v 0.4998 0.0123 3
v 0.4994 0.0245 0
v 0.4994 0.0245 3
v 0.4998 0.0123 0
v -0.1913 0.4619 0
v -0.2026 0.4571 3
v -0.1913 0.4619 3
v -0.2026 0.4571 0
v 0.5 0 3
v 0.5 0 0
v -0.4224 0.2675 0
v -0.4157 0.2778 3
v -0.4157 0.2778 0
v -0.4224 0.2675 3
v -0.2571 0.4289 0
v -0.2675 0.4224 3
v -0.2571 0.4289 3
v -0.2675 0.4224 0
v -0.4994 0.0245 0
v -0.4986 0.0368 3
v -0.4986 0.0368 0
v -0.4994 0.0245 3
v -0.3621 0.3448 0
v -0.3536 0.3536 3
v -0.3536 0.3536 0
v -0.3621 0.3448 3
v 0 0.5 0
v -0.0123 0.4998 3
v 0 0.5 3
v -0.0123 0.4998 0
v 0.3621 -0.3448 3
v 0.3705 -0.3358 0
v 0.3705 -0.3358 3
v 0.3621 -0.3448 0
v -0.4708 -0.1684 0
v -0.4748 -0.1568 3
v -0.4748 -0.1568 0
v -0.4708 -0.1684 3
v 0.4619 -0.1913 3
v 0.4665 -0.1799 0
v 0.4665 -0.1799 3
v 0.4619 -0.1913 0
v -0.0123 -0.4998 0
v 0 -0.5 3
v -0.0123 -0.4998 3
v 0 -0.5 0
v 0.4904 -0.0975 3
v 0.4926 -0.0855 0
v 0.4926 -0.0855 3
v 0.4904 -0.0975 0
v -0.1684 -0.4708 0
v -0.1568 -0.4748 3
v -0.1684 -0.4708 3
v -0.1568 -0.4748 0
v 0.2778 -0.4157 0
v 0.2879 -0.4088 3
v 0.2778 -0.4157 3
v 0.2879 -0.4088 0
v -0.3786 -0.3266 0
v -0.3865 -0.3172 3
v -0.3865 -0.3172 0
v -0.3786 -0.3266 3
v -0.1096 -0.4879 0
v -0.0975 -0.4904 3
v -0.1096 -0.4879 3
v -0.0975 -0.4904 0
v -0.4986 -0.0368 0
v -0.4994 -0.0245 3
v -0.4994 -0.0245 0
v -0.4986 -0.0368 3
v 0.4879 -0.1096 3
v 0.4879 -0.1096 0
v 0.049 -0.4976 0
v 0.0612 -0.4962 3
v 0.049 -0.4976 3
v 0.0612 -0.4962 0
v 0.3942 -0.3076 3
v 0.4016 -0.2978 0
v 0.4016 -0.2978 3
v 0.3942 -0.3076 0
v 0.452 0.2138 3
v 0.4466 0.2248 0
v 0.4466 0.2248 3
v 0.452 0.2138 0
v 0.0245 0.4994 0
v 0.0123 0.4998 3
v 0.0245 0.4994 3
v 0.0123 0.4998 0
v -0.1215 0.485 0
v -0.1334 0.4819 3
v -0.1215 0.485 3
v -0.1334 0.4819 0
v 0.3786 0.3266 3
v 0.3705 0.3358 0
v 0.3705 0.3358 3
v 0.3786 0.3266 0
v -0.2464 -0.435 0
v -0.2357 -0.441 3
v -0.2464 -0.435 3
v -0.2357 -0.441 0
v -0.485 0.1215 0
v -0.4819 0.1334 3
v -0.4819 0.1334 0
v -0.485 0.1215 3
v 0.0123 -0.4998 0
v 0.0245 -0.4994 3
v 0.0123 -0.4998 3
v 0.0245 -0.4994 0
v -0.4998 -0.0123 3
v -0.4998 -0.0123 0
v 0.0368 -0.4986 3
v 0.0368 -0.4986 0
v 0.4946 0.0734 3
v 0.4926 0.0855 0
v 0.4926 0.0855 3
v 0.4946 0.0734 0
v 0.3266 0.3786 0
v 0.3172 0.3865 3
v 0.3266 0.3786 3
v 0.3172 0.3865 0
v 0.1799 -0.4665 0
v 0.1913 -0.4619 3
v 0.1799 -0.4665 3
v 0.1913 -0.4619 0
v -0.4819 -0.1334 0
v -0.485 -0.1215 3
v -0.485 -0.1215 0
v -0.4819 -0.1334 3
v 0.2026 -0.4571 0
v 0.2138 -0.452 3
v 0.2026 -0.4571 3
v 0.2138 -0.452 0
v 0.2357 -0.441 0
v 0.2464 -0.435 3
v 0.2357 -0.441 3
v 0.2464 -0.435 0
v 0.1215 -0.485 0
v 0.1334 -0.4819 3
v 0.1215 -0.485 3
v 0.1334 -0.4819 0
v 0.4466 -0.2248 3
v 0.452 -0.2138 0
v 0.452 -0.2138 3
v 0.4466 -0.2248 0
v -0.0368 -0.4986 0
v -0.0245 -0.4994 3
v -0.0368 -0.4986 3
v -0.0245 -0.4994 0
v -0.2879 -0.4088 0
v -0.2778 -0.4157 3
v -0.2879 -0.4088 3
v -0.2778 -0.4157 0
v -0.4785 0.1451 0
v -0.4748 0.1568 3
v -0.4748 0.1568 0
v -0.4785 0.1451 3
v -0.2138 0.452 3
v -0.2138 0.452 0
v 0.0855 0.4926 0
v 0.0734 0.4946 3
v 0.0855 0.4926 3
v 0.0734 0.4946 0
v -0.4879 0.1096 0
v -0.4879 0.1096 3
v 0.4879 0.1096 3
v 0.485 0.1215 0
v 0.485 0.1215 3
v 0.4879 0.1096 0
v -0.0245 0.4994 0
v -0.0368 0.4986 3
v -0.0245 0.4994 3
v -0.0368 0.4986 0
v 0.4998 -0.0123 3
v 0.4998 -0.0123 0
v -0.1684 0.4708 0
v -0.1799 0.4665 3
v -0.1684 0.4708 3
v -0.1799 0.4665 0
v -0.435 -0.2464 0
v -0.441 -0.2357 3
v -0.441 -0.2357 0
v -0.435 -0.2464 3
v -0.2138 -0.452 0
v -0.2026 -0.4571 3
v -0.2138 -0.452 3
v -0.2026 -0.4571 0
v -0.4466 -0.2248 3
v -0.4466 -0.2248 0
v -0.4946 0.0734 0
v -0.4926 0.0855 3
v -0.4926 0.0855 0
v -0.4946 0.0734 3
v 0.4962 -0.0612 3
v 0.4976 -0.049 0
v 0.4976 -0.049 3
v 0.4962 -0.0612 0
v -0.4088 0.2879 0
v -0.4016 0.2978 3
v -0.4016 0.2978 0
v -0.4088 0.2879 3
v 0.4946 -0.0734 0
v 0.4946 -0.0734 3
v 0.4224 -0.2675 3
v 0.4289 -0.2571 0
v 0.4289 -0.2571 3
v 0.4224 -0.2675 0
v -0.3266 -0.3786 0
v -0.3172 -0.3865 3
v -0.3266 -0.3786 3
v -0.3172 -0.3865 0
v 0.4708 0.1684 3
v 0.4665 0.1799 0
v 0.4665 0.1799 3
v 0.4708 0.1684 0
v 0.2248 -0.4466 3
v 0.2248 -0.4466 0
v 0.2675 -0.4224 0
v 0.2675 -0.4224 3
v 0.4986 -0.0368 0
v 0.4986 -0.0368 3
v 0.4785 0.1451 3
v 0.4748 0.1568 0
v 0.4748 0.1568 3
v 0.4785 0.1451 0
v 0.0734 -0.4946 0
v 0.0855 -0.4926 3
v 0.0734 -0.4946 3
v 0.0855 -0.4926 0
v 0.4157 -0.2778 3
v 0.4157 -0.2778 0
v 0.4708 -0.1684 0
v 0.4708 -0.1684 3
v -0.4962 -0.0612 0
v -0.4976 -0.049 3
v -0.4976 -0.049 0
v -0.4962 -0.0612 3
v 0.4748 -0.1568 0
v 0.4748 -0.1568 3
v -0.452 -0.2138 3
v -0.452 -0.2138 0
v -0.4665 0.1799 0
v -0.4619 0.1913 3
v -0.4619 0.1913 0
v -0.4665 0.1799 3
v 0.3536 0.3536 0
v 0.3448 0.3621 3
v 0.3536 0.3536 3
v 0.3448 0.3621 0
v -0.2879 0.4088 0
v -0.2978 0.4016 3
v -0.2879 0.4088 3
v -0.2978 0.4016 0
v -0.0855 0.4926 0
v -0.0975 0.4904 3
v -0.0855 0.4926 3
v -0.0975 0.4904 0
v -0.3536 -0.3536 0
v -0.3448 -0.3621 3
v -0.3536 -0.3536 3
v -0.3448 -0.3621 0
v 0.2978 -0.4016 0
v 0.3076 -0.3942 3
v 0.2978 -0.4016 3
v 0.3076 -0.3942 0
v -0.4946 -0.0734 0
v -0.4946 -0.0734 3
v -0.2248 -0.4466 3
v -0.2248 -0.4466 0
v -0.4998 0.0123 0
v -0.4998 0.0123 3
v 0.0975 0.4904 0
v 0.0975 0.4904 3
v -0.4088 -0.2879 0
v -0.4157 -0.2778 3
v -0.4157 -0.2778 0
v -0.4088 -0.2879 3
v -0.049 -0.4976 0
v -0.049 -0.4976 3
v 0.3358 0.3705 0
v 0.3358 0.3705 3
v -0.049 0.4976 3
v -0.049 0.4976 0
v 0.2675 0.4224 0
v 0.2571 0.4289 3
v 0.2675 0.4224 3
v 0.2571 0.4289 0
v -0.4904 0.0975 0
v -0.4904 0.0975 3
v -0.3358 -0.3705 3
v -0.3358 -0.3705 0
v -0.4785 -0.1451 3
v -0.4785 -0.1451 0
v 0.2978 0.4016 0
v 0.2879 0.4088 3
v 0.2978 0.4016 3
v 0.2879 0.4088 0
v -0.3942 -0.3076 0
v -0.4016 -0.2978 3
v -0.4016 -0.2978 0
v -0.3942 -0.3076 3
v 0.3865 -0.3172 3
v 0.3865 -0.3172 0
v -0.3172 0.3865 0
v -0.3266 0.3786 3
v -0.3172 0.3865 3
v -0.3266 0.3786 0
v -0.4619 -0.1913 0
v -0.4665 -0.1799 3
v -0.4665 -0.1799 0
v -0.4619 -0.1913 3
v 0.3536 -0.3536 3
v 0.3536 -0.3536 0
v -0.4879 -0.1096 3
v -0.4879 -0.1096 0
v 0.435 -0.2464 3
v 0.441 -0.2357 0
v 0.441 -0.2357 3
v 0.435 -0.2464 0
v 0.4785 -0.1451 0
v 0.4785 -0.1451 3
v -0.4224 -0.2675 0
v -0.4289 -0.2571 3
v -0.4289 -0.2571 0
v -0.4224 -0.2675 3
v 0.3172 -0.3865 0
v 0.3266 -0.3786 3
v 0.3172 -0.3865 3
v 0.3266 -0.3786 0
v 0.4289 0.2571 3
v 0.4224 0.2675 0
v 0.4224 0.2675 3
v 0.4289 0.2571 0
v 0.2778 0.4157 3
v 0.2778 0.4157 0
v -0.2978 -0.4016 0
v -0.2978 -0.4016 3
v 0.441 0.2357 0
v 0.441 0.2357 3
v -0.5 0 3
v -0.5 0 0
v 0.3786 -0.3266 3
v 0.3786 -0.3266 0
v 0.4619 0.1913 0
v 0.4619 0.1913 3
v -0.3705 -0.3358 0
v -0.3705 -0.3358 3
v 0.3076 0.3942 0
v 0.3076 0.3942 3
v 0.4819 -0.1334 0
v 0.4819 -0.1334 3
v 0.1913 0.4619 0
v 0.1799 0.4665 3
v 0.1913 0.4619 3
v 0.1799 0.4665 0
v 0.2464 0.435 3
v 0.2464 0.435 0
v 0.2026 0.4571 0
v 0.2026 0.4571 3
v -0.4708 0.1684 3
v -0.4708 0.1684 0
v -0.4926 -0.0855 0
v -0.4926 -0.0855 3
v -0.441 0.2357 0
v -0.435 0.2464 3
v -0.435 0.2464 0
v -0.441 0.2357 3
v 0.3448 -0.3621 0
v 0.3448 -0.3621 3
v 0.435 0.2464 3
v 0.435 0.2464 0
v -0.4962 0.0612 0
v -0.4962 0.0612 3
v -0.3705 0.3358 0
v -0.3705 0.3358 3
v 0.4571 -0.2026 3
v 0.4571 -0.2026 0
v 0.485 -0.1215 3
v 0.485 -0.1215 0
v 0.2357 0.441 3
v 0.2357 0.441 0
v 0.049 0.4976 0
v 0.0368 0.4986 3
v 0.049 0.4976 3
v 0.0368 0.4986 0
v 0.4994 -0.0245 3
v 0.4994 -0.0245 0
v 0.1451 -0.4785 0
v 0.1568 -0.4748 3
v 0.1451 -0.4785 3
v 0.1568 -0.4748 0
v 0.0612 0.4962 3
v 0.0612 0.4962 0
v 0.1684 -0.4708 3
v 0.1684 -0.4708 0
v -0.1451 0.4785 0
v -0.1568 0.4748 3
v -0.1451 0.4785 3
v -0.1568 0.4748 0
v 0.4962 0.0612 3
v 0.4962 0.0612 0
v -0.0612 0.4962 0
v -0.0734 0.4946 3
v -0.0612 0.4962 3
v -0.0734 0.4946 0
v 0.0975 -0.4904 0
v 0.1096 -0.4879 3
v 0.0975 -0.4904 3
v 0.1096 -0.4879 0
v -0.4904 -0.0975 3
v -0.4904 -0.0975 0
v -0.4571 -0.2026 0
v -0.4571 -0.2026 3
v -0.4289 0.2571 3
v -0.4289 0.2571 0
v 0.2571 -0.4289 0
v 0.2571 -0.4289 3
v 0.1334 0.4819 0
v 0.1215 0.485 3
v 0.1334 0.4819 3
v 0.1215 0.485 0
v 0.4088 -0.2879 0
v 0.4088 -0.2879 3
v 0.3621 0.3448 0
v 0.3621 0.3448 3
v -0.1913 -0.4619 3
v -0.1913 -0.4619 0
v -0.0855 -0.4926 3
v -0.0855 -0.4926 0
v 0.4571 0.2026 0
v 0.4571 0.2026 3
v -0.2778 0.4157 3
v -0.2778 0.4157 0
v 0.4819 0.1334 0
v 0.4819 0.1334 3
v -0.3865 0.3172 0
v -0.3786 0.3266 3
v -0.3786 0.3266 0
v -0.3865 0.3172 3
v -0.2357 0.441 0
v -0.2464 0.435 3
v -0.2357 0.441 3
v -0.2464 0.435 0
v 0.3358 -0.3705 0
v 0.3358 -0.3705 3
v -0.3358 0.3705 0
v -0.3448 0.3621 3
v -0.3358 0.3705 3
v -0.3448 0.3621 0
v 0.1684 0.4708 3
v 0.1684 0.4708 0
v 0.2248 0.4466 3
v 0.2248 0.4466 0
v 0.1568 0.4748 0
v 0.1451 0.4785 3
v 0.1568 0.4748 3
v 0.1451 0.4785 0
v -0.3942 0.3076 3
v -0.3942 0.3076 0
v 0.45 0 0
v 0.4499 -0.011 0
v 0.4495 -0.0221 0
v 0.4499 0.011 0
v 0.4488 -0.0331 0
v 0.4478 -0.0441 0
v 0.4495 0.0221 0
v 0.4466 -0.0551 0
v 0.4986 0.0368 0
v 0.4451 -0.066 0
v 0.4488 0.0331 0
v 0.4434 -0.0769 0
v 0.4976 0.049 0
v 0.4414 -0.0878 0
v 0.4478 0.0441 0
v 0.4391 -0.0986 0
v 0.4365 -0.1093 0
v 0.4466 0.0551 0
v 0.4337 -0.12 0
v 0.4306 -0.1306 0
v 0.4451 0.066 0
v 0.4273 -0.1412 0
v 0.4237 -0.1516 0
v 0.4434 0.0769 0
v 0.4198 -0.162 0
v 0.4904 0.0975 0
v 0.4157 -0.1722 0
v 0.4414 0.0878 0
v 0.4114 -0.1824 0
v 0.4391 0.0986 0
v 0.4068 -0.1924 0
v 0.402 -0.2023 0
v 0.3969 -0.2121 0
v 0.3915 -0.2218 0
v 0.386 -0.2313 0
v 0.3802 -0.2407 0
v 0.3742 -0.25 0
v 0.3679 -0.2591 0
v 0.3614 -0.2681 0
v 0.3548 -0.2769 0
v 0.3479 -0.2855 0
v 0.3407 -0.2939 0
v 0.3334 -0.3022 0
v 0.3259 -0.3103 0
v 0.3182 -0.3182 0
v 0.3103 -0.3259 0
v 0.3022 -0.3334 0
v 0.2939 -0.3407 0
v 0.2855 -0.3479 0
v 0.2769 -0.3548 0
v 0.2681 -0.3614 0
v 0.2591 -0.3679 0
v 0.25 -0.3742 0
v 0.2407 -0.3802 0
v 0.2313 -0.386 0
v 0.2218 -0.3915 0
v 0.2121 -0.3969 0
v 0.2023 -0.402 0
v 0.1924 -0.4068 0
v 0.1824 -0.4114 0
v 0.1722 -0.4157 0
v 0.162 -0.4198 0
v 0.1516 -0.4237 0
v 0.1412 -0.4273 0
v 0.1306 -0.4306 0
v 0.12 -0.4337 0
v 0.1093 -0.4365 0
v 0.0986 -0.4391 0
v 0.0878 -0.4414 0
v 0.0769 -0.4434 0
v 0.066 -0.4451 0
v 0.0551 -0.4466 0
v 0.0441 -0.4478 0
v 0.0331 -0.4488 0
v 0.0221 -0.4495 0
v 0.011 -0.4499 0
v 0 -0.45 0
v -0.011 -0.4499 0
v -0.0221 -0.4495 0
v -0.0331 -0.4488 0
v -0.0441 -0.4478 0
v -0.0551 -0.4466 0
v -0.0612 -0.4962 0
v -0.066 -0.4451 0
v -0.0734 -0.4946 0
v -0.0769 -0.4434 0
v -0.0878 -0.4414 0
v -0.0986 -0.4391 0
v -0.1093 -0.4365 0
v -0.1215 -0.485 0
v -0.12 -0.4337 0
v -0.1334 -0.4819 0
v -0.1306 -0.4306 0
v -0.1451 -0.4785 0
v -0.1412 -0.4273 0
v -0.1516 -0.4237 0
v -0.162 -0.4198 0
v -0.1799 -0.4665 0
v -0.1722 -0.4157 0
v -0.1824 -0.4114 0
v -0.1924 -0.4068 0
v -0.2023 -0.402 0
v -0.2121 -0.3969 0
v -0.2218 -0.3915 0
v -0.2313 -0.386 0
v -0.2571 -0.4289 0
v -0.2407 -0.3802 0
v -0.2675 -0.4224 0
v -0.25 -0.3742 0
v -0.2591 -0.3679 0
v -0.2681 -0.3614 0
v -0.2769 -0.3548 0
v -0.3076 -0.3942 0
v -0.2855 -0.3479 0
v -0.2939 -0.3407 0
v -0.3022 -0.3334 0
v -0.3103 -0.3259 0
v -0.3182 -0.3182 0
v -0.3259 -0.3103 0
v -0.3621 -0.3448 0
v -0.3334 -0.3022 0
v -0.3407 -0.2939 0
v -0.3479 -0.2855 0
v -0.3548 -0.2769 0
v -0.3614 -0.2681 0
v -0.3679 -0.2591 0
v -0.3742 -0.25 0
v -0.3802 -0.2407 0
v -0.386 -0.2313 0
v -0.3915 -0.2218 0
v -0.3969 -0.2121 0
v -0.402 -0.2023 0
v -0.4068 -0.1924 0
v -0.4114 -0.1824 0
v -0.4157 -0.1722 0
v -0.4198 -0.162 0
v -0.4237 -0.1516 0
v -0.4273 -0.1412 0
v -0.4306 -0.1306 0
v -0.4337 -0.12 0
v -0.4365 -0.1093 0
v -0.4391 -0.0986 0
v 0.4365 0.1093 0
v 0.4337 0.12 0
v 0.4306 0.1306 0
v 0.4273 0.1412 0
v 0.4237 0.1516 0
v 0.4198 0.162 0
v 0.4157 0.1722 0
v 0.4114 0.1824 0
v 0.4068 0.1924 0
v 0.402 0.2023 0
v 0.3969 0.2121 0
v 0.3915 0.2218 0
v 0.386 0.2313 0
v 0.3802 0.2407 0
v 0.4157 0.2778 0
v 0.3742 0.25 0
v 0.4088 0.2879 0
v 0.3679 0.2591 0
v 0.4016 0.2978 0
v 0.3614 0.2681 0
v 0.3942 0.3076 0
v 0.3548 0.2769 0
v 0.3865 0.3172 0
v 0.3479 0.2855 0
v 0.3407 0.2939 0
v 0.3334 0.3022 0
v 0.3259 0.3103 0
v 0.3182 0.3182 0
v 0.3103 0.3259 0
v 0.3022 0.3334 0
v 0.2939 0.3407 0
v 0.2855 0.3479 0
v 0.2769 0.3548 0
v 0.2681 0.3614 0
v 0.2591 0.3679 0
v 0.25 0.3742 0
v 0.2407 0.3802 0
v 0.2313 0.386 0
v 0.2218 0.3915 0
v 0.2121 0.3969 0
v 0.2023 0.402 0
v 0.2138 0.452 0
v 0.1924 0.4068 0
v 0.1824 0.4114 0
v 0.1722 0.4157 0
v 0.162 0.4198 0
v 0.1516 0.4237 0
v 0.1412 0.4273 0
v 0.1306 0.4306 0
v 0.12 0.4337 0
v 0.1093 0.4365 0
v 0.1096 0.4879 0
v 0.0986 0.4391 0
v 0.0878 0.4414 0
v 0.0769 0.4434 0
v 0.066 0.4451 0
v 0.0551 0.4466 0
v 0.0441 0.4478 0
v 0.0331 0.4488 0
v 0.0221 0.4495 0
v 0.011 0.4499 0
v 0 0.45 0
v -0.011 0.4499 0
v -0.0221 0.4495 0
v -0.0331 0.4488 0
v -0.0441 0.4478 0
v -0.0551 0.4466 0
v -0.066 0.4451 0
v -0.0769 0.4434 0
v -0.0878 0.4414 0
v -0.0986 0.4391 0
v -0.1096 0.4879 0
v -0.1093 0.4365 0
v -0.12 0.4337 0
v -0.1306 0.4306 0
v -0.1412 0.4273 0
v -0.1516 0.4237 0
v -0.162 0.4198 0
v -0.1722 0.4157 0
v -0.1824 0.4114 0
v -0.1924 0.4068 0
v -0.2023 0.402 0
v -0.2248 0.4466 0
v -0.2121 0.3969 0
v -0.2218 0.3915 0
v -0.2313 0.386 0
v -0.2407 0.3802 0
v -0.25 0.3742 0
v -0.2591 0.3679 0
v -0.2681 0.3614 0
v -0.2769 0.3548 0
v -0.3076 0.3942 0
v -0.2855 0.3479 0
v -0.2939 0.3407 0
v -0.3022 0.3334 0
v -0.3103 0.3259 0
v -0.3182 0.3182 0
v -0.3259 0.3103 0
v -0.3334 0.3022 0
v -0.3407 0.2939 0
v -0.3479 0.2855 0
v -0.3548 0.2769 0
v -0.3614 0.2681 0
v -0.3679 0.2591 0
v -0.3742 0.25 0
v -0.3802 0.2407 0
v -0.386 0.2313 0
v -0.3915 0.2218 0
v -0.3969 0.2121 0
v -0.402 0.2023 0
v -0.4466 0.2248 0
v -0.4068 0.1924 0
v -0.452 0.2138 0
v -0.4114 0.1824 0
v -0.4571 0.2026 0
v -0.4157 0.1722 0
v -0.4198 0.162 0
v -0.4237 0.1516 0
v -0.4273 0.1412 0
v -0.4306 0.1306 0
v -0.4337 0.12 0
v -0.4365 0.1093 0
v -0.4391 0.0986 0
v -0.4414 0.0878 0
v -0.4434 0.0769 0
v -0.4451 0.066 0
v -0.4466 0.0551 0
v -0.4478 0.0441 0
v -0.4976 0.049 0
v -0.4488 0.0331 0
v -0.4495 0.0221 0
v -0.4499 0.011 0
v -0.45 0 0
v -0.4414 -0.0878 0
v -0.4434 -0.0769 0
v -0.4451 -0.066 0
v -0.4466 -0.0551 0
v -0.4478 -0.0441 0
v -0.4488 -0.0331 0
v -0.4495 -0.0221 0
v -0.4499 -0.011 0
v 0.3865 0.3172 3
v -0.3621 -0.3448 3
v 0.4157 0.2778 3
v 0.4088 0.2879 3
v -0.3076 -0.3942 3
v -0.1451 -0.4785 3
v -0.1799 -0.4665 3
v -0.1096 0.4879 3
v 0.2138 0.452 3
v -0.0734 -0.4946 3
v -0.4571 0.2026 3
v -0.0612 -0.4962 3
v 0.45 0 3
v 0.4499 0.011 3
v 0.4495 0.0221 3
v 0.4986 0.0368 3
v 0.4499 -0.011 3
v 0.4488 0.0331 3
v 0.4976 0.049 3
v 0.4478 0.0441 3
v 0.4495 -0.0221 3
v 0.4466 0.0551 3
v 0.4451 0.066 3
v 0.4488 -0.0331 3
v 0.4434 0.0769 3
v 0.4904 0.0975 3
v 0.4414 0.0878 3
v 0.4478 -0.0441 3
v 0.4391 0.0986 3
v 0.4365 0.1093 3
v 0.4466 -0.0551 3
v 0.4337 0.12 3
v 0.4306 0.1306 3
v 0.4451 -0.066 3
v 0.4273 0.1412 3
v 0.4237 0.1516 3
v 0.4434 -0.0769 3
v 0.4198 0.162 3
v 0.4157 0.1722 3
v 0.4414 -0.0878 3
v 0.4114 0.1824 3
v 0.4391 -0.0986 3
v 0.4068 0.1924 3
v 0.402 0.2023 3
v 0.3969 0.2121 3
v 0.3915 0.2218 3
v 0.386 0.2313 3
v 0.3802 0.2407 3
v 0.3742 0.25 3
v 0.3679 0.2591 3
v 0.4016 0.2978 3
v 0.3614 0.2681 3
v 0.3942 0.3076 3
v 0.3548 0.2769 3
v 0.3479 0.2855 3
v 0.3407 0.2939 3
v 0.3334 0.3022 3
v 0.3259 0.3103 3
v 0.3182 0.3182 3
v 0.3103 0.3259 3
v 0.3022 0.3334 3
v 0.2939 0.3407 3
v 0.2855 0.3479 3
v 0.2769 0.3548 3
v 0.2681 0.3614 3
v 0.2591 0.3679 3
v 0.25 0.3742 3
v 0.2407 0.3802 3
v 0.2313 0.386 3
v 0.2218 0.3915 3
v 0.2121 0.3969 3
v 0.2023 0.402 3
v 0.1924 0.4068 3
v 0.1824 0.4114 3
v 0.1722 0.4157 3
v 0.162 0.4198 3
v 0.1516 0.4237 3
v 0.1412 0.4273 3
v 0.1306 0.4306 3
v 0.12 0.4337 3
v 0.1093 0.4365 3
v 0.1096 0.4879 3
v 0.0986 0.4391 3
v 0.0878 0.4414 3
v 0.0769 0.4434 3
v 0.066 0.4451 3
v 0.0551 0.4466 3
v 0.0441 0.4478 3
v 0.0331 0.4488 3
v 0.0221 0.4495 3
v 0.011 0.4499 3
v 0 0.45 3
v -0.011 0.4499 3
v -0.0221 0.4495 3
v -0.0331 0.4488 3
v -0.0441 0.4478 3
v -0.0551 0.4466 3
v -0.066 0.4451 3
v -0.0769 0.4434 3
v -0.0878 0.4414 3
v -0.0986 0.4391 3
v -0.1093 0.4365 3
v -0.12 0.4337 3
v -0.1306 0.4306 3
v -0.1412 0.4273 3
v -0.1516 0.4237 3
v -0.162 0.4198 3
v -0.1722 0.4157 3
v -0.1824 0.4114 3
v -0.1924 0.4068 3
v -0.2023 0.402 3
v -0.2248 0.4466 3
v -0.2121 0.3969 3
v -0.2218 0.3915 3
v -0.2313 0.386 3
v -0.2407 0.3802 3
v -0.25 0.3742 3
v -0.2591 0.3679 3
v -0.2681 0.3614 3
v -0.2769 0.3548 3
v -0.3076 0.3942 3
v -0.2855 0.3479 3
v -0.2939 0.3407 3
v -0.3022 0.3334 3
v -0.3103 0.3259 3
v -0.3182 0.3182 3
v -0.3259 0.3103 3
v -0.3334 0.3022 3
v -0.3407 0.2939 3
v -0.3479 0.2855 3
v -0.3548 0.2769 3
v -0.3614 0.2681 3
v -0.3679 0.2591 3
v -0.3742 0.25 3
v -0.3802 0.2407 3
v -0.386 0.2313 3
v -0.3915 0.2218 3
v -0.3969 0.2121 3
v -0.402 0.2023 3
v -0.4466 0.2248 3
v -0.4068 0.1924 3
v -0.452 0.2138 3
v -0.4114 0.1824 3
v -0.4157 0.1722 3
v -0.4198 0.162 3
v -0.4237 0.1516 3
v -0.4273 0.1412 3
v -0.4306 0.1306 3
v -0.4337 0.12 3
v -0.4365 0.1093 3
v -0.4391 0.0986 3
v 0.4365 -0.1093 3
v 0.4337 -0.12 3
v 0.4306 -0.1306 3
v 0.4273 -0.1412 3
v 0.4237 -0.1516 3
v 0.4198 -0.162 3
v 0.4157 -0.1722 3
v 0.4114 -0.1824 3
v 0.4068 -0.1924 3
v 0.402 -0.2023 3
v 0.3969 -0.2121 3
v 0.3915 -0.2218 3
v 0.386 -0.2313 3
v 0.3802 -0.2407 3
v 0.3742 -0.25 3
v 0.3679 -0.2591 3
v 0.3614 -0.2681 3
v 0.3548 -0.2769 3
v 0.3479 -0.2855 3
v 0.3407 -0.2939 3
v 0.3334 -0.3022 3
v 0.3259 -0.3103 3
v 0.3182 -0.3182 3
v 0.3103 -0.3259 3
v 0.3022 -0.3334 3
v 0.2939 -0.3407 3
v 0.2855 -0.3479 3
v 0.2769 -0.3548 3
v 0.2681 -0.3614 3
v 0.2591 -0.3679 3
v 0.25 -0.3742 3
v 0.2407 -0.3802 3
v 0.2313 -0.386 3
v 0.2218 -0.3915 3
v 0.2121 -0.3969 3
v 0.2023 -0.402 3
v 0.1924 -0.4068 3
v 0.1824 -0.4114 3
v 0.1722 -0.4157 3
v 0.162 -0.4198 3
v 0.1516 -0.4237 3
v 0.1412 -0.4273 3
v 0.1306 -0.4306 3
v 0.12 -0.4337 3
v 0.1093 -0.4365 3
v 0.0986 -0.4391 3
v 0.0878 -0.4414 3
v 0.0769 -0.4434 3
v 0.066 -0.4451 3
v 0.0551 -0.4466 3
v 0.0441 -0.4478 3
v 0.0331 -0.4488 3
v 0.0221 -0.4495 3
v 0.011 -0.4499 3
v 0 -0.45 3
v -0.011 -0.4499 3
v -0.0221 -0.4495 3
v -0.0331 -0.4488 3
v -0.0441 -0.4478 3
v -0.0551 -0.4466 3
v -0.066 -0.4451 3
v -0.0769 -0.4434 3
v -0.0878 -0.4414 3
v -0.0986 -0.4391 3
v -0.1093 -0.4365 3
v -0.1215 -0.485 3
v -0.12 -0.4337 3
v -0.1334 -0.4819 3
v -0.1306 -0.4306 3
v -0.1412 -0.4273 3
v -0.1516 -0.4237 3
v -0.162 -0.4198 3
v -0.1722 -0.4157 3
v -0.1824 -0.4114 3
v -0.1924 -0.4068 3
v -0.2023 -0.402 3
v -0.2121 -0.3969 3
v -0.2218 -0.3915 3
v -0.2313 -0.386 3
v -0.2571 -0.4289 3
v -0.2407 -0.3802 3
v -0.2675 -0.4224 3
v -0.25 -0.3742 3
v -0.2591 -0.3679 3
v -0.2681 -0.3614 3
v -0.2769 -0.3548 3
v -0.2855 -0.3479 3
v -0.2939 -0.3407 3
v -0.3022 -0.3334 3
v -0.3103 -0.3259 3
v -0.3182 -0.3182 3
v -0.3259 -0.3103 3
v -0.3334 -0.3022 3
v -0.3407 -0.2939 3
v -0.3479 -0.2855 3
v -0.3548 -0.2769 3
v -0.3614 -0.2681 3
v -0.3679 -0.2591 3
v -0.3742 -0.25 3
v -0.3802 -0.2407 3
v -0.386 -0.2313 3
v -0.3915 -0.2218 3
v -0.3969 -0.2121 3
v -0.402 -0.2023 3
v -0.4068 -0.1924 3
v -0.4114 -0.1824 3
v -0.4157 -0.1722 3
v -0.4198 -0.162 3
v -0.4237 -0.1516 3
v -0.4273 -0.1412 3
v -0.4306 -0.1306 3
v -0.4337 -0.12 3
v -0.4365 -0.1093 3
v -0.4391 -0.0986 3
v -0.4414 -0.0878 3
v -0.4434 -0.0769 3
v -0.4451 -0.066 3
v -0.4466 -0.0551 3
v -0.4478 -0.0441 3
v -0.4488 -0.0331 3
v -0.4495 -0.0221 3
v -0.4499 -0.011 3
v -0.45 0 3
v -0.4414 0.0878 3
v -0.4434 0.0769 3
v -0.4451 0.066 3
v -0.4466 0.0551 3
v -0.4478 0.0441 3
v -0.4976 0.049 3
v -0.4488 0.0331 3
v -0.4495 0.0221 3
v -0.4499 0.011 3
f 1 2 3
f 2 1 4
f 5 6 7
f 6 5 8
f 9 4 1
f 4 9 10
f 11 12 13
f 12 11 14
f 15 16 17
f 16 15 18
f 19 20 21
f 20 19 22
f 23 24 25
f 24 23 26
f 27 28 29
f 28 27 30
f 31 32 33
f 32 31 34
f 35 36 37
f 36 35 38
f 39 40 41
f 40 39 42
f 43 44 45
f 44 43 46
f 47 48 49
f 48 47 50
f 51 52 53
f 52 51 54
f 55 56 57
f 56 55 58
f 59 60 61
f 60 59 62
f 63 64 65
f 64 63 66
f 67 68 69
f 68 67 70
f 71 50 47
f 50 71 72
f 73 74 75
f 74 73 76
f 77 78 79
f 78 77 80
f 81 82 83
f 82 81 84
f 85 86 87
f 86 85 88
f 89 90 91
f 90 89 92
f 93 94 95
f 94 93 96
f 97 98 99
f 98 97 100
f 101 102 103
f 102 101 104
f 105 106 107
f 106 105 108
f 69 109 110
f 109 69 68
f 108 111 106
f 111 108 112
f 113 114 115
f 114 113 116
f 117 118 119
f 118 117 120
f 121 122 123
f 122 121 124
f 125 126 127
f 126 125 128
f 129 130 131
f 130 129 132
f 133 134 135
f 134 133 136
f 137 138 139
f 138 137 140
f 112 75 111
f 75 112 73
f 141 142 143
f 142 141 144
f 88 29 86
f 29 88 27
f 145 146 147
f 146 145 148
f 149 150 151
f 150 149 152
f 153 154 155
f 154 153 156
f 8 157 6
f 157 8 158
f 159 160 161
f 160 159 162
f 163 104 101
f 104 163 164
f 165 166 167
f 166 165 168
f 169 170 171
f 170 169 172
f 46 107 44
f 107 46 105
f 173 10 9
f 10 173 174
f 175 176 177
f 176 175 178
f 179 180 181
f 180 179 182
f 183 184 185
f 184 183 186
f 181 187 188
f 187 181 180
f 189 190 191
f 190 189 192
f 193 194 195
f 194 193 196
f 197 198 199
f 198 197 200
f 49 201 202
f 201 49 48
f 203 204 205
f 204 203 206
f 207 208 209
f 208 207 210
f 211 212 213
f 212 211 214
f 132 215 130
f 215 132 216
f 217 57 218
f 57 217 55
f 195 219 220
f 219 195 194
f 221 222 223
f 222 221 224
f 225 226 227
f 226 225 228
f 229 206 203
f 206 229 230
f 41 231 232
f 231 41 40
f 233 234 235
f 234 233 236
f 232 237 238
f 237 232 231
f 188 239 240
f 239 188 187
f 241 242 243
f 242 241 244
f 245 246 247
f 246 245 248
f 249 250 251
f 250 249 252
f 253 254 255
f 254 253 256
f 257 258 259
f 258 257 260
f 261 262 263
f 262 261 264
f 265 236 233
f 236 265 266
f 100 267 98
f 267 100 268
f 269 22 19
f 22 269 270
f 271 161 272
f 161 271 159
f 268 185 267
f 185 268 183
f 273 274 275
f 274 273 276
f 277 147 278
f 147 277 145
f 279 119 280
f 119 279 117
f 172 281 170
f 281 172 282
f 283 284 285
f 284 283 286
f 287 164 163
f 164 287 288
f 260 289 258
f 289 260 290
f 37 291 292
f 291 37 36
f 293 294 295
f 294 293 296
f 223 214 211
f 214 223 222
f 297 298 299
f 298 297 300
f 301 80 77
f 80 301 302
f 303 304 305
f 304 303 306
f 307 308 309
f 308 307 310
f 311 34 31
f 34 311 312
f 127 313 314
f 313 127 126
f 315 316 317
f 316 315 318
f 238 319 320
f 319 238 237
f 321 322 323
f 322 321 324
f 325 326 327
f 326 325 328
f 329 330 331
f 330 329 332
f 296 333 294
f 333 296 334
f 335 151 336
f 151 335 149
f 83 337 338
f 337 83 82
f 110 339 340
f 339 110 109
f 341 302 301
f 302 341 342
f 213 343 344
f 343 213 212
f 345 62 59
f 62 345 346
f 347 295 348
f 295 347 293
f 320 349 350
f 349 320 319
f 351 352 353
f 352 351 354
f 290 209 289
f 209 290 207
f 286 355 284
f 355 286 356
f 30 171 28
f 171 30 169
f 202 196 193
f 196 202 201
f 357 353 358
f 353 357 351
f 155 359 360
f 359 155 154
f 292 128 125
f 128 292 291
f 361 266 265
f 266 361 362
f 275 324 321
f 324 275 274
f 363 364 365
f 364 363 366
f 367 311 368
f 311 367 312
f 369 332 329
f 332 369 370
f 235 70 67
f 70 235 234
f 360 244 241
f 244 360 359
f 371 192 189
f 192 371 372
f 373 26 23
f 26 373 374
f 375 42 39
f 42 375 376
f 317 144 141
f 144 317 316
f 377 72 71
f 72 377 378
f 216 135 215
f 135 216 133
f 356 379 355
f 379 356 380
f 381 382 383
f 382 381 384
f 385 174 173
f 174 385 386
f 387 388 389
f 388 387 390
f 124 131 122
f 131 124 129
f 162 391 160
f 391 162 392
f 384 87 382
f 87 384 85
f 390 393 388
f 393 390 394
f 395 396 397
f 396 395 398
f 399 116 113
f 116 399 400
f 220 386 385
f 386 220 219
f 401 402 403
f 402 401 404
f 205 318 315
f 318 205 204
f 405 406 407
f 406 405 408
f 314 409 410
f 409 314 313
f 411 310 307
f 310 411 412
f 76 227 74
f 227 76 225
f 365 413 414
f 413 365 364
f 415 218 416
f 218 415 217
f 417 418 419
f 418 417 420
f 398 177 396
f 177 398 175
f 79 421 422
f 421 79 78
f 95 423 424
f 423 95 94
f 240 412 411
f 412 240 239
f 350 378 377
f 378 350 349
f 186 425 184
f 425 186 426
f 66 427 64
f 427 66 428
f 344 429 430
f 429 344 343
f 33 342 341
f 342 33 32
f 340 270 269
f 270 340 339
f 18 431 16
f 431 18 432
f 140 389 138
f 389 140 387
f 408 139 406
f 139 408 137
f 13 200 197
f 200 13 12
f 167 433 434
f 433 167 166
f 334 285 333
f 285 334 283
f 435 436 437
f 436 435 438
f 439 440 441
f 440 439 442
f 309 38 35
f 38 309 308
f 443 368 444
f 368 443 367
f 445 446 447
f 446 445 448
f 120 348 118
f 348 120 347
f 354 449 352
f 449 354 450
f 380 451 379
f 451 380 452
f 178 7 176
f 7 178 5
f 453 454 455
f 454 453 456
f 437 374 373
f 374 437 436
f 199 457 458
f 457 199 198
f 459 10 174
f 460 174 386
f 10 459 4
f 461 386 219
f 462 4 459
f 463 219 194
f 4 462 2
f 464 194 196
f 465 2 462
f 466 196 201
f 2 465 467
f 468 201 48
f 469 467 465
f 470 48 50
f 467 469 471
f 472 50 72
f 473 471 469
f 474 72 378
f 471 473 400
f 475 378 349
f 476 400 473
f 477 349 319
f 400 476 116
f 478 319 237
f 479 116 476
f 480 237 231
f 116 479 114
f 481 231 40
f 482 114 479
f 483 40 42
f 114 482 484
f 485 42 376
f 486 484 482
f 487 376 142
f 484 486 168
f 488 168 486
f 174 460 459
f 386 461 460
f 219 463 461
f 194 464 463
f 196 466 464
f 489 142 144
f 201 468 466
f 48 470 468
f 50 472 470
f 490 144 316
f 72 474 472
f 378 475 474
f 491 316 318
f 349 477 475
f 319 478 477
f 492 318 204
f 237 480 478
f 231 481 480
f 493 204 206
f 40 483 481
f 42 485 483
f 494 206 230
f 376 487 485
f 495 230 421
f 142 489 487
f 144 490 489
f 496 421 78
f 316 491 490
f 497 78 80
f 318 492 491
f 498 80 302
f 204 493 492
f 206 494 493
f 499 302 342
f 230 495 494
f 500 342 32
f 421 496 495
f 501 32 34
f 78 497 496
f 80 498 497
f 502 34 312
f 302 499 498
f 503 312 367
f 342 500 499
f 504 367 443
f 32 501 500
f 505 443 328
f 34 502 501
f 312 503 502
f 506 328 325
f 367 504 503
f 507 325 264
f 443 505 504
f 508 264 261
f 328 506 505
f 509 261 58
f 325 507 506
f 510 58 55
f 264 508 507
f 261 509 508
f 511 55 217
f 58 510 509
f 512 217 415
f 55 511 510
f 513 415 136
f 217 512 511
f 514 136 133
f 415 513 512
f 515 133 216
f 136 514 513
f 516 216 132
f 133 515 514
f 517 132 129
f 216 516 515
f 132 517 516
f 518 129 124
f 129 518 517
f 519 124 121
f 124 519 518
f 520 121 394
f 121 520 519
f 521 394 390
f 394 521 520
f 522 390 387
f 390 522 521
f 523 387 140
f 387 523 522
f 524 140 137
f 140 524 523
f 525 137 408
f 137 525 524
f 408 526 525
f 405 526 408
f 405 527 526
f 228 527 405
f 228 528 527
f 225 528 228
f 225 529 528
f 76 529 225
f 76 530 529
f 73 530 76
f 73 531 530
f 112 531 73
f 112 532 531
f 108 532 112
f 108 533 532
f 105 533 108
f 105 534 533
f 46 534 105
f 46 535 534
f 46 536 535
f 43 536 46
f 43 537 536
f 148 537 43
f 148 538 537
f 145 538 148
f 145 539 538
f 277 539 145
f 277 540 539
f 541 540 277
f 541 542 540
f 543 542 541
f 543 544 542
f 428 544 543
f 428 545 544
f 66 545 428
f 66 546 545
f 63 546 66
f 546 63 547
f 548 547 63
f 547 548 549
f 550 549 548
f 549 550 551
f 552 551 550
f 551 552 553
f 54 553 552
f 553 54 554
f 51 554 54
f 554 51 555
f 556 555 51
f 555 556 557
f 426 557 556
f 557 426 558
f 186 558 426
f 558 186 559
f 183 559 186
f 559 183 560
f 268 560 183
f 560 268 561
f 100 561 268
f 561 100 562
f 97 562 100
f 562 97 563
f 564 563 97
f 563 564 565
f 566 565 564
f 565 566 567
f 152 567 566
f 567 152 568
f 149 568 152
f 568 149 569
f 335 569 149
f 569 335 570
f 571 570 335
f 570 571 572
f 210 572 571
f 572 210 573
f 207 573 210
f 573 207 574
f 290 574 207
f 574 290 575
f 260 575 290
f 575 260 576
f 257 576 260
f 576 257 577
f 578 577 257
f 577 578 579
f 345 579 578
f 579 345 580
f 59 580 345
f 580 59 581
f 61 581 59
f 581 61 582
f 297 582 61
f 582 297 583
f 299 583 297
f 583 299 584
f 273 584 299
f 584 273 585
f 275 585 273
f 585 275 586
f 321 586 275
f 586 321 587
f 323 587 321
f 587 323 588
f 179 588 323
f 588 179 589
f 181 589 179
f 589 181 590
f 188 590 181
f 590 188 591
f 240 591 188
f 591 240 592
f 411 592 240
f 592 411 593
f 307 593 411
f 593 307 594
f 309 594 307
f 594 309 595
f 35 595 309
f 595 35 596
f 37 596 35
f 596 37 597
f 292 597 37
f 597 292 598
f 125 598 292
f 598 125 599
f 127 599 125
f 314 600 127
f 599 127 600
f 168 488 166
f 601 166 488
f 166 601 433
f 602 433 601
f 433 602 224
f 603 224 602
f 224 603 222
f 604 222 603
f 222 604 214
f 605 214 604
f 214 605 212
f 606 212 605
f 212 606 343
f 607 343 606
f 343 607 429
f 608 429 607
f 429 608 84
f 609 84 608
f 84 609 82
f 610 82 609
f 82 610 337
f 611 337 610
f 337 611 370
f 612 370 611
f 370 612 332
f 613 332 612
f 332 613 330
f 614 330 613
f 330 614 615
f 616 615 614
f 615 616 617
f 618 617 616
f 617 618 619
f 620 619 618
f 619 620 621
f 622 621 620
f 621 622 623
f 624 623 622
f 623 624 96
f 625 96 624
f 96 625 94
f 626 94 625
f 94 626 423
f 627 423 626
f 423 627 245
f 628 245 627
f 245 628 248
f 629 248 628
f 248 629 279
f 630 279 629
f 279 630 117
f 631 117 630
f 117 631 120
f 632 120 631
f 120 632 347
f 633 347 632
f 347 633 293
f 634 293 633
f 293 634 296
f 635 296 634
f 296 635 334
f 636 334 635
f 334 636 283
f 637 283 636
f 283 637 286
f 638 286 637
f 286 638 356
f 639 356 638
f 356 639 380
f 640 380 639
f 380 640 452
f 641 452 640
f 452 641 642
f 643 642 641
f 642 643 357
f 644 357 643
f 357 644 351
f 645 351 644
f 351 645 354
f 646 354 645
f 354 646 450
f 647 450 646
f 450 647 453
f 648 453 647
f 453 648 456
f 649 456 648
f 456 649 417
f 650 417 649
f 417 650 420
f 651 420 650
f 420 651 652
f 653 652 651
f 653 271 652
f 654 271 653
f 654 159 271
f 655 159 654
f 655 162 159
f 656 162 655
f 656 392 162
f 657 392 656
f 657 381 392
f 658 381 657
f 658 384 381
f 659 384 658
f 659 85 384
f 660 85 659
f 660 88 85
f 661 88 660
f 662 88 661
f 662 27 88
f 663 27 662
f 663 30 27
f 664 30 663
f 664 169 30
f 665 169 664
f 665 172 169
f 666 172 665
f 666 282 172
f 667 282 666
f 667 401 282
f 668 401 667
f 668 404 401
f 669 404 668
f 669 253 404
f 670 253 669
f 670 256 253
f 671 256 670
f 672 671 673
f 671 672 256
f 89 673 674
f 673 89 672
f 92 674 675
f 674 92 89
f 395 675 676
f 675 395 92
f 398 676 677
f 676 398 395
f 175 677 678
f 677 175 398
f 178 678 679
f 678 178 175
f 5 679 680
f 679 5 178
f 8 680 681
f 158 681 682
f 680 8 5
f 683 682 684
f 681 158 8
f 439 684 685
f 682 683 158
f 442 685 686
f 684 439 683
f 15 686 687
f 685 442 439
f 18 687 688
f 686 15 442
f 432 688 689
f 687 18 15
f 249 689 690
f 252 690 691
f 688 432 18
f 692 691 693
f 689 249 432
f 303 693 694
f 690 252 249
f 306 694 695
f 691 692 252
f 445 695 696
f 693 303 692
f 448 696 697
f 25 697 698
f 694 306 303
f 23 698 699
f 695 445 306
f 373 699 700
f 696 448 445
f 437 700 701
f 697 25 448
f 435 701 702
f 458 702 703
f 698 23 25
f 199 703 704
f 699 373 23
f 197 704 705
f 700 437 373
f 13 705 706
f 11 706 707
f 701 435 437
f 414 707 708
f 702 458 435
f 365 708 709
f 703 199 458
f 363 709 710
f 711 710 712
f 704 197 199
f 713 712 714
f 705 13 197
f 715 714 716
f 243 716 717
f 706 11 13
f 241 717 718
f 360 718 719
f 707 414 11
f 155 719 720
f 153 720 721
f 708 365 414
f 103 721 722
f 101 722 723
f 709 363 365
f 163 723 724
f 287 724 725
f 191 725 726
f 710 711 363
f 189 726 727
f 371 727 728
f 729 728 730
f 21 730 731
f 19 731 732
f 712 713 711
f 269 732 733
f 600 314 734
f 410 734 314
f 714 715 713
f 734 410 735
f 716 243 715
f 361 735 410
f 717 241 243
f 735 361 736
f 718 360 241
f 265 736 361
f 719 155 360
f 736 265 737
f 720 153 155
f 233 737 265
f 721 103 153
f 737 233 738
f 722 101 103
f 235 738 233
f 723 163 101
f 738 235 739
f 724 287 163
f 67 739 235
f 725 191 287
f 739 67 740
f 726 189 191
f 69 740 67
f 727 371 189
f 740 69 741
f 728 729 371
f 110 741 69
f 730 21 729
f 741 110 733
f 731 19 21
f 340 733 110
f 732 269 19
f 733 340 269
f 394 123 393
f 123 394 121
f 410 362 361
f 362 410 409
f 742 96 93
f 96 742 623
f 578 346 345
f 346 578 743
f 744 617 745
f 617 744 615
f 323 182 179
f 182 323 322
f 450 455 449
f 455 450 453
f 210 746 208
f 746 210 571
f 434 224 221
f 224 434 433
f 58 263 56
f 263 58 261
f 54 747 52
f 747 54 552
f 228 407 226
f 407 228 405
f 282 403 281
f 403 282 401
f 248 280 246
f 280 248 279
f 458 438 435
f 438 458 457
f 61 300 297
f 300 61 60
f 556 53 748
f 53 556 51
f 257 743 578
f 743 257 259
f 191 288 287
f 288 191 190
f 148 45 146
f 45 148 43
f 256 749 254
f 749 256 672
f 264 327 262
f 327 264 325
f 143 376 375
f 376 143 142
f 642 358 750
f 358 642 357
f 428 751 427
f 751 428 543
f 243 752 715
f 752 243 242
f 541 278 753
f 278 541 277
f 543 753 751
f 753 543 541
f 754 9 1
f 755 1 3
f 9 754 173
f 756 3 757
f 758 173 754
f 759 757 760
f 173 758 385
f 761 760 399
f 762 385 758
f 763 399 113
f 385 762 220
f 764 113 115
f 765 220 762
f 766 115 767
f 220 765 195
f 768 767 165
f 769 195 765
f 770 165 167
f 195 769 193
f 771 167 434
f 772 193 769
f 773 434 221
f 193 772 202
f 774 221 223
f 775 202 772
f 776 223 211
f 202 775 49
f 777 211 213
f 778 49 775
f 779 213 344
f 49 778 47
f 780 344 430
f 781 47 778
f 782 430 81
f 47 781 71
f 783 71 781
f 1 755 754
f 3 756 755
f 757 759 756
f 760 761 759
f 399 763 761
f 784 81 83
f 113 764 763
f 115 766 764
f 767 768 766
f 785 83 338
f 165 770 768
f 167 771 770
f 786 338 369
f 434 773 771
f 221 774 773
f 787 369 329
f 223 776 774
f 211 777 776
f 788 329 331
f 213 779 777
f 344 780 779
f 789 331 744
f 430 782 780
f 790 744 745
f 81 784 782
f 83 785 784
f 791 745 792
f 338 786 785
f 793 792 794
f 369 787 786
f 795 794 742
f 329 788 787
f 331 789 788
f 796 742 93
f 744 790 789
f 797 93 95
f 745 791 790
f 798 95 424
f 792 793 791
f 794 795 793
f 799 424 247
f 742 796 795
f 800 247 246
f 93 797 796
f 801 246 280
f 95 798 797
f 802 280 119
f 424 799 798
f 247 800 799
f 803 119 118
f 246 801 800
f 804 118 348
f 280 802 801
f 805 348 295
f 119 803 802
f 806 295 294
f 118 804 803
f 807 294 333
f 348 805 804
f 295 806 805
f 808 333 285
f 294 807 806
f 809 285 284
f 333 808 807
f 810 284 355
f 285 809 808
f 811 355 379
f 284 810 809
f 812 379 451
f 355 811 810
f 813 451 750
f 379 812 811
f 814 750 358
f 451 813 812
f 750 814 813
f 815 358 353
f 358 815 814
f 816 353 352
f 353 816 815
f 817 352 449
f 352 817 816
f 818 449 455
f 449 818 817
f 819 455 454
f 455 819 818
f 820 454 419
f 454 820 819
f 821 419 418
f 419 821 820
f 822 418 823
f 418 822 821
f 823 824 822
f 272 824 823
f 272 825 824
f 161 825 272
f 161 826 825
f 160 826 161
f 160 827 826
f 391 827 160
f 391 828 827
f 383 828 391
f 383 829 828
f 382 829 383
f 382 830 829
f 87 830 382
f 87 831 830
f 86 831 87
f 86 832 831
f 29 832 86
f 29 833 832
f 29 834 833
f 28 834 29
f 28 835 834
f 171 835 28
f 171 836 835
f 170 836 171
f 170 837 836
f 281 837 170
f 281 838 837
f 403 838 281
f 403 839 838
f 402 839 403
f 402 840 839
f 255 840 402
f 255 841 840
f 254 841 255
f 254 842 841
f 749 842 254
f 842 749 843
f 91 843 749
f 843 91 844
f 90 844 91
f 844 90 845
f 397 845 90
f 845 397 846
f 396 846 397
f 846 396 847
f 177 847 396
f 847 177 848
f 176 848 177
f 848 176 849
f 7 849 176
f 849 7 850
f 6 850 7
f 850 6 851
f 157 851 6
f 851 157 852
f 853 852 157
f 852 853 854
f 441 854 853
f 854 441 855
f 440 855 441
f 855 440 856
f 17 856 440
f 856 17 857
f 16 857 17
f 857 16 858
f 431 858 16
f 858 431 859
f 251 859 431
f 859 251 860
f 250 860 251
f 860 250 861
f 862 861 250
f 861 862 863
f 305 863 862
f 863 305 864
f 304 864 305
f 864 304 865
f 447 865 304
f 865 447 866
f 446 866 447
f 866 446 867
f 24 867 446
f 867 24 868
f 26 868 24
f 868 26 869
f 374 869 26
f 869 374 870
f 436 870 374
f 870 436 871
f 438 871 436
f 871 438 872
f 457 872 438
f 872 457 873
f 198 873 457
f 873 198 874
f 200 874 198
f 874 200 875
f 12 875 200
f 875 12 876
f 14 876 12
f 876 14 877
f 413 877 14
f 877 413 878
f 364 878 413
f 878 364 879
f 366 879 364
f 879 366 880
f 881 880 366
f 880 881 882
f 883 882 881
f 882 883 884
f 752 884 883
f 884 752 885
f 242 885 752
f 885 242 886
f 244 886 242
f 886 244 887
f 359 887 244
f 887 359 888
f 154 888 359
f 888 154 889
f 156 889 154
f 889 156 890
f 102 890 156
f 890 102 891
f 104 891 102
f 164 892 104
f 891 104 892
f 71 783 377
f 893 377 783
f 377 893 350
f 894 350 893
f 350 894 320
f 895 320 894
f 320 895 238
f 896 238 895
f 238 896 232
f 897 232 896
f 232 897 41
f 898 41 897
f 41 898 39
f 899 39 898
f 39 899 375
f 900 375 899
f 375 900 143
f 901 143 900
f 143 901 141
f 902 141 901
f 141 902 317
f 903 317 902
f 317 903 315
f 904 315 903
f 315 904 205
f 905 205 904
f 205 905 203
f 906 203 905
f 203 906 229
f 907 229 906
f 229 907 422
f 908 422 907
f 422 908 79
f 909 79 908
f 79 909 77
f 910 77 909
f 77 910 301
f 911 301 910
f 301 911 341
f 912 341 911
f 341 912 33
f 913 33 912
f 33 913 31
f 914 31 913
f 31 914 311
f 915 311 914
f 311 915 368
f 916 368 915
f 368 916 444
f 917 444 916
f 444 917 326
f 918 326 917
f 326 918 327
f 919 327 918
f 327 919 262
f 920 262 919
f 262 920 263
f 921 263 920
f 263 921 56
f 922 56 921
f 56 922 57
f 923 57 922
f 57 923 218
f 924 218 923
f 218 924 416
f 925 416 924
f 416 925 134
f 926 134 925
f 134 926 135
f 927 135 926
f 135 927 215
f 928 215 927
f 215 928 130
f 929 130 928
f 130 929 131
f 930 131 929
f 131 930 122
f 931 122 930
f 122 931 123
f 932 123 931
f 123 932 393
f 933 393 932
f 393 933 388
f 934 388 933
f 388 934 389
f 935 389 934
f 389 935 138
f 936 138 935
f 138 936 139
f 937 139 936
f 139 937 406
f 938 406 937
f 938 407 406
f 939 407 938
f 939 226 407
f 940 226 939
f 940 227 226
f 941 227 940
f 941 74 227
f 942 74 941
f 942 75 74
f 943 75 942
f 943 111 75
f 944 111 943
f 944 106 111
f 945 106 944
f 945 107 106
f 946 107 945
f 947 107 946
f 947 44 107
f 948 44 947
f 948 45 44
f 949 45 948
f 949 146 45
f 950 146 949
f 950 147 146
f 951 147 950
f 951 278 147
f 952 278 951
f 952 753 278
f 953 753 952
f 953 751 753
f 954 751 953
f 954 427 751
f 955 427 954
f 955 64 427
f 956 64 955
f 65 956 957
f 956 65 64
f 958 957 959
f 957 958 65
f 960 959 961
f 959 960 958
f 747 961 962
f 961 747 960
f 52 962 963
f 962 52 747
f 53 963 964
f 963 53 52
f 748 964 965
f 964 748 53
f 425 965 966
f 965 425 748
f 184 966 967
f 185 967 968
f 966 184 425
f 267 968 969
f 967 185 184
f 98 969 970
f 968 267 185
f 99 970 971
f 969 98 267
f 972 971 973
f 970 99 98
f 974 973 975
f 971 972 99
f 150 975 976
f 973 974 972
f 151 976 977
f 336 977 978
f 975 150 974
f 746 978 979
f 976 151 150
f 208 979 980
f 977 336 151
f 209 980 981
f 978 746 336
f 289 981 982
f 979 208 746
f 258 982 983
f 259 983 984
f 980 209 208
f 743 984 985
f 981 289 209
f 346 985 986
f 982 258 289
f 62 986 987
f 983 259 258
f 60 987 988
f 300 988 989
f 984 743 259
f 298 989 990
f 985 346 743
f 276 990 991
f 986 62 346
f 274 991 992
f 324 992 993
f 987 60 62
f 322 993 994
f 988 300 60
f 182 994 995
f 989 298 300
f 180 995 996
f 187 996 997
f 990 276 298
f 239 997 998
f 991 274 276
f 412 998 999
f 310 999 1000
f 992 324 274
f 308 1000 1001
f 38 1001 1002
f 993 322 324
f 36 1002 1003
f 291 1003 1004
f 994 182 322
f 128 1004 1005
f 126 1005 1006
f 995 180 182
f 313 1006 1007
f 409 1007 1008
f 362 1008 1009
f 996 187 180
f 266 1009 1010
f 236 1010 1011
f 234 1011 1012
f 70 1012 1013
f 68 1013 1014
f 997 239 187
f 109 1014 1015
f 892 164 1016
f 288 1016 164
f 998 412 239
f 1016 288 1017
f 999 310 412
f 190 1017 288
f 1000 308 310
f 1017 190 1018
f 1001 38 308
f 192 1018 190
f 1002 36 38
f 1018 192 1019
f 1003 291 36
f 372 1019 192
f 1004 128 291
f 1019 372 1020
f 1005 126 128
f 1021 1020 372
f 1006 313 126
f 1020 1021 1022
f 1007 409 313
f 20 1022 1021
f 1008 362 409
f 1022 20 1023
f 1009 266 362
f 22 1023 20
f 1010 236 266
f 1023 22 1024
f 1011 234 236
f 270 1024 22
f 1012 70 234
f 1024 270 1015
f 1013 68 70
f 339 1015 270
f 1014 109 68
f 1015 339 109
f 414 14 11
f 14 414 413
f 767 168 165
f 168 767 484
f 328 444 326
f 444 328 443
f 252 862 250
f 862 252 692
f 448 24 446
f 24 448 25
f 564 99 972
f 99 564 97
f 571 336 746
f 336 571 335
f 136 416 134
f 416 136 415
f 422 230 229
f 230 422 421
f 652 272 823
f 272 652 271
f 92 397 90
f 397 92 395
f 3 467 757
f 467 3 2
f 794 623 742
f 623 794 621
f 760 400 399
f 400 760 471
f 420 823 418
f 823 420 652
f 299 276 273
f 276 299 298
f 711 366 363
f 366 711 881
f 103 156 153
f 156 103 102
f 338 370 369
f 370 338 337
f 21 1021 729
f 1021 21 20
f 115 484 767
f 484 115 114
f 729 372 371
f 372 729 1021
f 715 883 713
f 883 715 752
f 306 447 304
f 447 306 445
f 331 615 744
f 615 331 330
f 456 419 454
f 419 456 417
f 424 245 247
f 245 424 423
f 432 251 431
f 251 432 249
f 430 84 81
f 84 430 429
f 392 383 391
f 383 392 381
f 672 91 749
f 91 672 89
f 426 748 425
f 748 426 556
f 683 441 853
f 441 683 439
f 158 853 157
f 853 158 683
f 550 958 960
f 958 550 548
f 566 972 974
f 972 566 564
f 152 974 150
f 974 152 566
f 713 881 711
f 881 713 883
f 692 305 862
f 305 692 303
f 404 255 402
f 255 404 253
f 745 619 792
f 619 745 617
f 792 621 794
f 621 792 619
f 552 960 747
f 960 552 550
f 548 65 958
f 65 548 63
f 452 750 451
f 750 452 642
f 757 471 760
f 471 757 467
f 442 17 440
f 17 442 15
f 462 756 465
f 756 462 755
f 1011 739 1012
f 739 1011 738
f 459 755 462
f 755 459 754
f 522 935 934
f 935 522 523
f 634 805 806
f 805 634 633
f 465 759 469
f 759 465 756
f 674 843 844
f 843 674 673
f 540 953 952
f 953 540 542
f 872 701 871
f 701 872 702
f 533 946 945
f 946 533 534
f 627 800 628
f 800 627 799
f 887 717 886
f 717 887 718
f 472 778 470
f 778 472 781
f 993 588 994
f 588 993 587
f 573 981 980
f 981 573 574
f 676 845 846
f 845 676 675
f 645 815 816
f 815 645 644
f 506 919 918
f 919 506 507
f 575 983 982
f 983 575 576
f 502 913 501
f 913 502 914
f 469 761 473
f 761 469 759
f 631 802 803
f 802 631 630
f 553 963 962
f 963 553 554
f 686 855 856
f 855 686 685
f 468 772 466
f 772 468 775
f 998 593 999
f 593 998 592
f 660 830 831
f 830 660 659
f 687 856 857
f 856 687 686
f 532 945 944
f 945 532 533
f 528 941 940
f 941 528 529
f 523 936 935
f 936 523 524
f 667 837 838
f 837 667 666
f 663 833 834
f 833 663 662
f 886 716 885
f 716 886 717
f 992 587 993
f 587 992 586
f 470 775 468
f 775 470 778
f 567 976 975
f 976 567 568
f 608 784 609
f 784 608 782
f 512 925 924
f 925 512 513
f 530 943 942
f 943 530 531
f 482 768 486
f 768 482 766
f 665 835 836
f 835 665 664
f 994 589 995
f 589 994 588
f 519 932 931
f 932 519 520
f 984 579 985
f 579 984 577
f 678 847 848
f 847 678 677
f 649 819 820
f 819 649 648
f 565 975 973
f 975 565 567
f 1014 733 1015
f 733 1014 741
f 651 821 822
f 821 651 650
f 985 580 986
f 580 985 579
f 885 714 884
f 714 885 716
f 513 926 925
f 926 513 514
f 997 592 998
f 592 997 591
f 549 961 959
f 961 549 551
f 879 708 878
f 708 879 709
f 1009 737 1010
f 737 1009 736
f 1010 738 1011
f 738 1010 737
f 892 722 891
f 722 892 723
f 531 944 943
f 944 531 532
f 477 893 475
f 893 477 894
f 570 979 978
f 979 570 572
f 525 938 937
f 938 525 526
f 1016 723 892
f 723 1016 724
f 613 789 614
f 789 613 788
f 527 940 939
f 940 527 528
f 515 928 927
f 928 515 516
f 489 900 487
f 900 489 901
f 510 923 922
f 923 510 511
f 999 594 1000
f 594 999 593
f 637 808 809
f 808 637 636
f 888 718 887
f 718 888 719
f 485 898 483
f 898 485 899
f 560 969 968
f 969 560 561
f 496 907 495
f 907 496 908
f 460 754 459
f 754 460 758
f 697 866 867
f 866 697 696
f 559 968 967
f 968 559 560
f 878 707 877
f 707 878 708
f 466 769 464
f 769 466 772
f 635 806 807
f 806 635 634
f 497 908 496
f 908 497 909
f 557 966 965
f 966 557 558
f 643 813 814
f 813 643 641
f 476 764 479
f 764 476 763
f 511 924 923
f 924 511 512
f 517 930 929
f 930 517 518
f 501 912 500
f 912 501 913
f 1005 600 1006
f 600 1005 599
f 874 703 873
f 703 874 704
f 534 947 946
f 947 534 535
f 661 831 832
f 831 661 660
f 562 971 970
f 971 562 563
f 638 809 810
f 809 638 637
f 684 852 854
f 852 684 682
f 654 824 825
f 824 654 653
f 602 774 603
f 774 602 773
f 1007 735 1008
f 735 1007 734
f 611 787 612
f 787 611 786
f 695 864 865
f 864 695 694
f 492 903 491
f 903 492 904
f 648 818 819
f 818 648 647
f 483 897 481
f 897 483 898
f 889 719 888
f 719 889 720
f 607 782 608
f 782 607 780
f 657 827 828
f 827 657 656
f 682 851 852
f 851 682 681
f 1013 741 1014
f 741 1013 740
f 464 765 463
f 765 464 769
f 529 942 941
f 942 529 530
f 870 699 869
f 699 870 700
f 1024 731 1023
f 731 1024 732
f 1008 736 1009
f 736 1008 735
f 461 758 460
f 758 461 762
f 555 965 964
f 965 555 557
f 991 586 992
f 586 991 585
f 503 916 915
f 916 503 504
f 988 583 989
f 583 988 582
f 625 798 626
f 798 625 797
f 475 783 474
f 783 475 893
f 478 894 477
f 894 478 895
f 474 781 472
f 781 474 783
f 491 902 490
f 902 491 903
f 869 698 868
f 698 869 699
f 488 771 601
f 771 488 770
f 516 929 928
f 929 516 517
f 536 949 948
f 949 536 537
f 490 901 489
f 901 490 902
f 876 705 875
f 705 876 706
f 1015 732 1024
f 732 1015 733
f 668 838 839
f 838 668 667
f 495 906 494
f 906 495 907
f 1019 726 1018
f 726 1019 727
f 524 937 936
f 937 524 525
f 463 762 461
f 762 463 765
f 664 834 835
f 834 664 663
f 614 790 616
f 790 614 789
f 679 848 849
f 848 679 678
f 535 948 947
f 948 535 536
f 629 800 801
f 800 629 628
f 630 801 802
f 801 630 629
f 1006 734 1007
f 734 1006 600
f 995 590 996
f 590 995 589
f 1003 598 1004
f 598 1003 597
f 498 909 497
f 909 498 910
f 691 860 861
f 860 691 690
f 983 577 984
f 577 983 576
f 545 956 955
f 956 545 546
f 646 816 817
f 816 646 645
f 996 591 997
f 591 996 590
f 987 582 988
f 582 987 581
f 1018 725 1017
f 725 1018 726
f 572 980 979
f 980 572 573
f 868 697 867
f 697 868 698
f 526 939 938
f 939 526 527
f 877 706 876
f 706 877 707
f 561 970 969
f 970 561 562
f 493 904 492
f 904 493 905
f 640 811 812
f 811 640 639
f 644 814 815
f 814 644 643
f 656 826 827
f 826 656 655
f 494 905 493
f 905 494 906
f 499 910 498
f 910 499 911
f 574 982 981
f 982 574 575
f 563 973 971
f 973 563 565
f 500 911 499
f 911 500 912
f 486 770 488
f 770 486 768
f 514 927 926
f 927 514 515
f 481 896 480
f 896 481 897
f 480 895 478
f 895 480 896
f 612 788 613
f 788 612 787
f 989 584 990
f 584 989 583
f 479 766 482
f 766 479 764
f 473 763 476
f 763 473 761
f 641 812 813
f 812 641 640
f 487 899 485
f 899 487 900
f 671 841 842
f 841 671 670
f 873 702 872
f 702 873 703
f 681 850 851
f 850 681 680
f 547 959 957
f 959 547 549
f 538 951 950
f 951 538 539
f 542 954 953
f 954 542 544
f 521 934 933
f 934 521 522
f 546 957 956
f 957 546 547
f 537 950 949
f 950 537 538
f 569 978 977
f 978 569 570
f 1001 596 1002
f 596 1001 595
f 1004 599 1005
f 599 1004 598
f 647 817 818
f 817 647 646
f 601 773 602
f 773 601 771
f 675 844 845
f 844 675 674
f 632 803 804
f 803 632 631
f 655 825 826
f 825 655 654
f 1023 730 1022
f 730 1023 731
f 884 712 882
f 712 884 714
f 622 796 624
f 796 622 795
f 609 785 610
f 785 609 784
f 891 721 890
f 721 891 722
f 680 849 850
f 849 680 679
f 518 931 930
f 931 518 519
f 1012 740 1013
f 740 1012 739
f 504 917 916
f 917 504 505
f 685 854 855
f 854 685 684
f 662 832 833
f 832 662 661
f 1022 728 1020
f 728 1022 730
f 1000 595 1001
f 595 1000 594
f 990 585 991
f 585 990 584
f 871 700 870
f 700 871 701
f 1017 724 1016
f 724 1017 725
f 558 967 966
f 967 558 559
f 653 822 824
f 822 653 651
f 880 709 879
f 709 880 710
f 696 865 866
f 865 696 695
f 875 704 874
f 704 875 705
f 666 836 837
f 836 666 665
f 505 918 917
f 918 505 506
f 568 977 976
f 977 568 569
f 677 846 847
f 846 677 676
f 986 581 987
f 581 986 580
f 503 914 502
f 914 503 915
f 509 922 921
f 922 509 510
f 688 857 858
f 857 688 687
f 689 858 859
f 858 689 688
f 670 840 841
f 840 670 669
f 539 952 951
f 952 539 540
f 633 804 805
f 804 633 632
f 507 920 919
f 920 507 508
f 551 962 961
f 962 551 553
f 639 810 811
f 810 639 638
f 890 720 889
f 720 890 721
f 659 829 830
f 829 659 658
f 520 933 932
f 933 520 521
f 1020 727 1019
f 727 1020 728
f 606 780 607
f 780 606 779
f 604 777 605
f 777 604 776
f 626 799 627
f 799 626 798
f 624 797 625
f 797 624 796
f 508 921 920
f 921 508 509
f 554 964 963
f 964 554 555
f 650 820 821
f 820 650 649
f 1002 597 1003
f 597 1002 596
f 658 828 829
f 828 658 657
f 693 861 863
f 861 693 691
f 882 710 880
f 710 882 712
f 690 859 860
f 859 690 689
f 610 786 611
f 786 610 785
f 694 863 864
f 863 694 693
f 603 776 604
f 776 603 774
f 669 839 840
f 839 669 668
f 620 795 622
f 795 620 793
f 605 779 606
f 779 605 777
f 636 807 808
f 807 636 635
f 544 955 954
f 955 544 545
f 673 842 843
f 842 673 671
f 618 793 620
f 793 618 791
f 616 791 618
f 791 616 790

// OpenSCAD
// Tube (Narrow) for Stacks of Shapes
// by Slashee the Cow
$fn = 256;

color("MediumVioletRed")
difference(){
    linear_extrude(3)
        circle(d=1);
    linear_extrude(4)
        circle(d=0.9);
}
